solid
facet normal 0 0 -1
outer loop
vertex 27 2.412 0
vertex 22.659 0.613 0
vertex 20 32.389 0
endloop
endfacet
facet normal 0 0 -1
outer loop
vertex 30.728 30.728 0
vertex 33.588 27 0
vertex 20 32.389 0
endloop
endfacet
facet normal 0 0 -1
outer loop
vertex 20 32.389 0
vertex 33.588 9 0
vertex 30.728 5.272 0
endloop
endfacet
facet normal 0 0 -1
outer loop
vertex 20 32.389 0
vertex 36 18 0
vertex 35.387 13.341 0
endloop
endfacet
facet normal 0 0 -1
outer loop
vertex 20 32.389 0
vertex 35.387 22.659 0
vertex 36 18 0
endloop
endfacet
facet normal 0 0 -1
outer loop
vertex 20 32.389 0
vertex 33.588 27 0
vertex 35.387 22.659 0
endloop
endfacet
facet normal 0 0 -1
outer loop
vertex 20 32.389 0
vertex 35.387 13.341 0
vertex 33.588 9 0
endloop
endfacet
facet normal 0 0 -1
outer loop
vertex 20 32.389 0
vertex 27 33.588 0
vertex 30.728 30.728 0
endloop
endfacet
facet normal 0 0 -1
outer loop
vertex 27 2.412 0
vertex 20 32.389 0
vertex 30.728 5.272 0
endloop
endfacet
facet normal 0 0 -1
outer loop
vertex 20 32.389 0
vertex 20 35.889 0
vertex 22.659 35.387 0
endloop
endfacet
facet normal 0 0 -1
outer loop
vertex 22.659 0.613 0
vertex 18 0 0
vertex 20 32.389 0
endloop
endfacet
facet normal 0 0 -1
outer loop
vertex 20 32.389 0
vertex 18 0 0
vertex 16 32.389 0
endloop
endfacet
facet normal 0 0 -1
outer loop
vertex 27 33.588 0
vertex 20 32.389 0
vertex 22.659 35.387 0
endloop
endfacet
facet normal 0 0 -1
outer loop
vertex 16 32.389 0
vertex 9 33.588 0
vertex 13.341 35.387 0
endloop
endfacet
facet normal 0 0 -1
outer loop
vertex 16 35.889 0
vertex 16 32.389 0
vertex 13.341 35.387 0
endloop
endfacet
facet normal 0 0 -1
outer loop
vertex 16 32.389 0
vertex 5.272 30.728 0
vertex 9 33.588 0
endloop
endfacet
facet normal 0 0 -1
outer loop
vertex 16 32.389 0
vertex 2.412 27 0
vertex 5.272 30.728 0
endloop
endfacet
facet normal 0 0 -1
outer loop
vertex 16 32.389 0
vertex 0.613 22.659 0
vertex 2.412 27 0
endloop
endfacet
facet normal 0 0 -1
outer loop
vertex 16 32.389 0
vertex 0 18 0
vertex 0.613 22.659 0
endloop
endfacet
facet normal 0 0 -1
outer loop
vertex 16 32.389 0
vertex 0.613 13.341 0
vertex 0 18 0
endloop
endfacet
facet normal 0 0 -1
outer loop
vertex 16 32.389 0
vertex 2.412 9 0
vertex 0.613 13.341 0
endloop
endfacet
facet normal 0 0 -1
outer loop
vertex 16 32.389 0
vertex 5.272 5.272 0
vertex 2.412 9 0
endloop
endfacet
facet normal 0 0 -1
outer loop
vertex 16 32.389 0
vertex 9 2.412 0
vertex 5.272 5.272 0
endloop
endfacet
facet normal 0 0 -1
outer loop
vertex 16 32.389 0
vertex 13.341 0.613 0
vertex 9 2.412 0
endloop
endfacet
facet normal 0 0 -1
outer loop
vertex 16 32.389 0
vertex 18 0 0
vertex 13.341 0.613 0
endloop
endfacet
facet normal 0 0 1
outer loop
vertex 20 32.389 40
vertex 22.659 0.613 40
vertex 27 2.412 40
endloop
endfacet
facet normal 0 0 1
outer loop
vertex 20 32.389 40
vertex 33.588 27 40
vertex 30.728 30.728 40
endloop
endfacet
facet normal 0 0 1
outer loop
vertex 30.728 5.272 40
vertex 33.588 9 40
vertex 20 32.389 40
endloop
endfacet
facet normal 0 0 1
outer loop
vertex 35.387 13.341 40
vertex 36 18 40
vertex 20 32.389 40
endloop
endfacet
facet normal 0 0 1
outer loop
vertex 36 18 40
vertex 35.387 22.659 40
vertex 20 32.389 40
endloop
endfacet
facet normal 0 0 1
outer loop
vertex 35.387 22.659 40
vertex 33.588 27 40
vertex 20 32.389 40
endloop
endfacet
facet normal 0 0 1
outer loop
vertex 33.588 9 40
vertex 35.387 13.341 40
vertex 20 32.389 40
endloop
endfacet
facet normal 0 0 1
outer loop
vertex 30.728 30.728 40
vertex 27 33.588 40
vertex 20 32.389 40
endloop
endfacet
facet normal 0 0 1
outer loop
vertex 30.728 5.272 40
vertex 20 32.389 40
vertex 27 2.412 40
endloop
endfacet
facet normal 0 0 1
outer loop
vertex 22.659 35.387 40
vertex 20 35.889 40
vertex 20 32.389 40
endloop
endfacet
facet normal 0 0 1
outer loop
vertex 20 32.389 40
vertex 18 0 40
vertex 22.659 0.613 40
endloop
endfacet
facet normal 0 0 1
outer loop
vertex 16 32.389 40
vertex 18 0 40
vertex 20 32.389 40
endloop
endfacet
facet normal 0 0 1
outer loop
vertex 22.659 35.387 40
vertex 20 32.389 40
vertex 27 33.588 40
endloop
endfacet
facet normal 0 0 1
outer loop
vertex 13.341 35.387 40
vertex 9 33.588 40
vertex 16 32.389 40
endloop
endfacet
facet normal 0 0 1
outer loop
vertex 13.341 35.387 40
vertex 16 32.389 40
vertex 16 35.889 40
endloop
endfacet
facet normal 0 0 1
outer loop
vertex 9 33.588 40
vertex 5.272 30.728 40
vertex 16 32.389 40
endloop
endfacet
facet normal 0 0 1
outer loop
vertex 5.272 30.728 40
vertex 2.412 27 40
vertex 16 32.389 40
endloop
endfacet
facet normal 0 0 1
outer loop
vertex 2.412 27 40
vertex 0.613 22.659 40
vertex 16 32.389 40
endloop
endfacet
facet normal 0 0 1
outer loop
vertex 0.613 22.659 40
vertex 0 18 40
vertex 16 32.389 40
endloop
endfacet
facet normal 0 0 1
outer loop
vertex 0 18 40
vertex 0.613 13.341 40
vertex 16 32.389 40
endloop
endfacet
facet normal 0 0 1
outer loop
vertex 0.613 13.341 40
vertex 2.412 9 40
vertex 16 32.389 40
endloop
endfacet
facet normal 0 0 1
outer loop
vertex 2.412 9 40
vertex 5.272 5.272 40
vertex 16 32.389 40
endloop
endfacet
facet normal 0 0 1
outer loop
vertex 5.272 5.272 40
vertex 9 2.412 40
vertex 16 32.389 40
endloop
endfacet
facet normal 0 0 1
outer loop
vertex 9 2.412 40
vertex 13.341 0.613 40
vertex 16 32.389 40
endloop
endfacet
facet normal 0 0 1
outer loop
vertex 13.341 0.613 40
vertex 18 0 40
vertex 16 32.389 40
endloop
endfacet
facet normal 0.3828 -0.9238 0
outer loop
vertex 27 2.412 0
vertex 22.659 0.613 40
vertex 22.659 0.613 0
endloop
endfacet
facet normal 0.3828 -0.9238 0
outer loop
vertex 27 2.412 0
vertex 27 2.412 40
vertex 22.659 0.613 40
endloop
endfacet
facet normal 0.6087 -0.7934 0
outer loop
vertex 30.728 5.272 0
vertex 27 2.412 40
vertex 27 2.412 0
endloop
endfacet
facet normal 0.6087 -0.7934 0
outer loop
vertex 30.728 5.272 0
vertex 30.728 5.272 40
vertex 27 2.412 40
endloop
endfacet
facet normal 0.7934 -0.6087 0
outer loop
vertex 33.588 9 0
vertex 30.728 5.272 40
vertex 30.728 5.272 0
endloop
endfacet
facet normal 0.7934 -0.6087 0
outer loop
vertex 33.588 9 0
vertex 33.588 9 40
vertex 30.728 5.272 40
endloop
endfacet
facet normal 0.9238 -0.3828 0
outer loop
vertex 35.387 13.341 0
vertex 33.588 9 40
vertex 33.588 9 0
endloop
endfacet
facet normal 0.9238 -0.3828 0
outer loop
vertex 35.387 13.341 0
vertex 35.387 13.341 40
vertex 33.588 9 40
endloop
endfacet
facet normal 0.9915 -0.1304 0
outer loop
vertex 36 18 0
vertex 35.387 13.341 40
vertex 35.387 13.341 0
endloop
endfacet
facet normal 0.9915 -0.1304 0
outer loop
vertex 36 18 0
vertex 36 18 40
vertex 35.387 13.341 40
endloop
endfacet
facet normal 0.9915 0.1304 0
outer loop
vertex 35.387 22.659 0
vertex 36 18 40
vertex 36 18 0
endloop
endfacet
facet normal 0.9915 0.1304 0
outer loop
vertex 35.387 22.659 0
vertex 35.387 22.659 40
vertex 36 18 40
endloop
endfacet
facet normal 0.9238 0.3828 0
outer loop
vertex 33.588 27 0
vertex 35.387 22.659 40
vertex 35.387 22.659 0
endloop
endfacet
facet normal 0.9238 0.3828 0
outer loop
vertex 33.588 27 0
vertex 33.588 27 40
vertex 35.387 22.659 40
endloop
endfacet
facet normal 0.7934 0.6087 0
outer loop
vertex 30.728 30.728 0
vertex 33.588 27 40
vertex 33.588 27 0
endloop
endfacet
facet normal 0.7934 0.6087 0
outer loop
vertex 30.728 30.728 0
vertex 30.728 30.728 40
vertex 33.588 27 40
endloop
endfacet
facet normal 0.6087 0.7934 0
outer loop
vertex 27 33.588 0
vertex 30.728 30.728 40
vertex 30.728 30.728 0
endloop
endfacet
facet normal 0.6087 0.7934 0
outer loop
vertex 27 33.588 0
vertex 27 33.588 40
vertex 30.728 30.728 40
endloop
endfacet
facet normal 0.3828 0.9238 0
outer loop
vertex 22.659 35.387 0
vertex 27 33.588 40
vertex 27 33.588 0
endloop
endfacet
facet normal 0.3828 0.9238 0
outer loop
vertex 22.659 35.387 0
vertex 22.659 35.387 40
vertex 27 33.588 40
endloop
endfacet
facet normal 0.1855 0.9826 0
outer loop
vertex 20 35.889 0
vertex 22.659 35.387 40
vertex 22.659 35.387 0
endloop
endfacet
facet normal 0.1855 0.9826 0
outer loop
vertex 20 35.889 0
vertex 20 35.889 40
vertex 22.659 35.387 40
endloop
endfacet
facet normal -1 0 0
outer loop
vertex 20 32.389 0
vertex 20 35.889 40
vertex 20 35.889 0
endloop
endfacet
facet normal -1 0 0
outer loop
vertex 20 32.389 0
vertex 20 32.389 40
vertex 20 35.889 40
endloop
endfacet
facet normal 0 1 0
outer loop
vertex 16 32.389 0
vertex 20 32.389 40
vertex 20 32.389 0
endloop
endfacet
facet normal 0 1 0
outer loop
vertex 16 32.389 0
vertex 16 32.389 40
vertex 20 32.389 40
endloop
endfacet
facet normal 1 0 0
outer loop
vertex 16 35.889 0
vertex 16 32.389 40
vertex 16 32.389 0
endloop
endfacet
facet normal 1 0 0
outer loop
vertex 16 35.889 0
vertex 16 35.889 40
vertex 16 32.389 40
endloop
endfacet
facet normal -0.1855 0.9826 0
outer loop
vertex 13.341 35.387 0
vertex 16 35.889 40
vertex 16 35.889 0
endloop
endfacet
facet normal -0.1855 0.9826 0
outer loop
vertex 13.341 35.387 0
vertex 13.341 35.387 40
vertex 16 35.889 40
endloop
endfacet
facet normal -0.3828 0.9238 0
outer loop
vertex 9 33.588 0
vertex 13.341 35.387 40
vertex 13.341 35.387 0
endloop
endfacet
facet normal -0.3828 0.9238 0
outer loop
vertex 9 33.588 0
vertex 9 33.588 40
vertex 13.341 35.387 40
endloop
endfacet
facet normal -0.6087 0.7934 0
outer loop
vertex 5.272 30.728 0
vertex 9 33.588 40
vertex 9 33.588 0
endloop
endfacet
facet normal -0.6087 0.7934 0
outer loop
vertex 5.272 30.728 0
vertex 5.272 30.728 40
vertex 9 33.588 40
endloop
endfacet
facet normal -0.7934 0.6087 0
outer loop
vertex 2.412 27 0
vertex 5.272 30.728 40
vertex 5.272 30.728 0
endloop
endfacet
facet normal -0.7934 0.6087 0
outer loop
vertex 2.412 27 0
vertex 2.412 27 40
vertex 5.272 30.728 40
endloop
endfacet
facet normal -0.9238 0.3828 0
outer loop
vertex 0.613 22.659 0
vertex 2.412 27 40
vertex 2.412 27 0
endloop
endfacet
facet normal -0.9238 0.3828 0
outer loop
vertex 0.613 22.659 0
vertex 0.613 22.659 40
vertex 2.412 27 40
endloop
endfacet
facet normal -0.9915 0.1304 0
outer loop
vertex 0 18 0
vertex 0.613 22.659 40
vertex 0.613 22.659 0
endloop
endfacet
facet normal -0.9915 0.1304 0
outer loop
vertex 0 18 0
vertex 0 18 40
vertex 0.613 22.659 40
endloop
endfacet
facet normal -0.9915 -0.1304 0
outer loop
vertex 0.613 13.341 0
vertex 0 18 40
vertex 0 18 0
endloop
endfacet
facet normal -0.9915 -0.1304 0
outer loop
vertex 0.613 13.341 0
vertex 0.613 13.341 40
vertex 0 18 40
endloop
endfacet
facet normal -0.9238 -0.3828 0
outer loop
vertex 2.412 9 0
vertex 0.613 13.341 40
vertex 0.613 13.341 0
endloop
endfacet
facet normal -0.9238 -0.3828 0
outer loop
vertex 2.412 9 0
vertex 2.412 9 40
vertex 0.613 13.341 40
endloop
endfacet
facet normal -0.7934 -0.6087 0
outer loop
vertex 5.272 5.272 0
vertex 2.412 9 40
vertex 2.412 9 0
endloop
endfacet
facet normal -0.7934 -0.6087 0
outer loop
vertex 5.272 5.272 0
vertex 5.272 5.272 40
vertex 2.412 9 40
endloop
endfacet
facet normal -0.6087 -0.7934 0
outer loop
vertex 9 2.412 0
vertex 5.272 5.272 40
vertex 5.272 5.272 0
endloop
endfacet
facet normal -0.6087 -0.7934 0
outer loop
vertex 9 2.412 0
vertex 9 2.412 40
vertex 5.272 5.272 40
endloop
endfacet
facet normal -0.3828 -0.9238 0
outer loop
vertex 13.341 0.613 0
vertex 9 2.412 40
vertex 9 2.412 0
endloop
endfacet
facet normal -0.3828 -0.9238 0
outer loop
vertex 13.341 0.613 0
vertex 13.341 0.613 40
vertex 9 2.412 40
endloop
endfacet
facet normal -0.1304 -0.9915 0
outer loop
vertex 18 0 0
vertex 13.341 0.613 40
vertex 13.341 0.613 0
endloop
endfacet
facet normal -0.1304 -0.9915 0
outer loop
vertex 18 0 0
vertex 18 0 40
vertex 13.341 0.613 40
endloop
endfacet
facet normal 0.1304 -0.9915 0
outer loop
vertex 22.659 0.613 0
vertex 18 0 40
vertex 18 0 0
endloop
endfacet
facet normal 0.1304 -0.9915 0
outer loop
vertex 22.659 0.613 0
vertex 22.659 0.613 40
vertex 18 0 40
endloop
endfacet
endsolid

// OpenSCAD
$fn = 32;

// ----------------------------------------------------------------------
// Keyway shaft: d36 shaft, key 4 x 3.5 mm
// ----------------------------------------------------------------------

// --- parameters (mm) ---
shaft_r = 18;             // shaft radius
key_w = 4;                // keyway width
key_d = 3.5;              // keyway depth below the surface line
plate_t = 40;             // shaft length, Z (extrusion height)

shaft_d = 2 * shaft_r;  // shaft diameter
circle_step = 15;  // polygon sampling step, degrees

profile = [[13.341, 35.387], [9, 33.588], [5.272, 30.728], [2.412, 27], [0.613, 22.659], [0, 18], [0.613, 13.341], [2.412, 9], [5.272, 5.272], [9, 2.412], [13.341, 0.613], [18, 0], [22.659, 0.613], [27, 2.412], [30.728, 5.272], [33.588, 9], [35.387, 13.341], [36, 18], [35.387, 22.659], [33.588, 27], [30.728, 30.728], [27, 33.588], [22.659, 35.387], [20, 35.889], [20, 32.389], [16, 32.389], [16, 35.889]];  // primary outline, 27 points, counter clockwise

// --- the one profile operation ---
linear_extrude(height = plate_t) polygon(points = profile);
